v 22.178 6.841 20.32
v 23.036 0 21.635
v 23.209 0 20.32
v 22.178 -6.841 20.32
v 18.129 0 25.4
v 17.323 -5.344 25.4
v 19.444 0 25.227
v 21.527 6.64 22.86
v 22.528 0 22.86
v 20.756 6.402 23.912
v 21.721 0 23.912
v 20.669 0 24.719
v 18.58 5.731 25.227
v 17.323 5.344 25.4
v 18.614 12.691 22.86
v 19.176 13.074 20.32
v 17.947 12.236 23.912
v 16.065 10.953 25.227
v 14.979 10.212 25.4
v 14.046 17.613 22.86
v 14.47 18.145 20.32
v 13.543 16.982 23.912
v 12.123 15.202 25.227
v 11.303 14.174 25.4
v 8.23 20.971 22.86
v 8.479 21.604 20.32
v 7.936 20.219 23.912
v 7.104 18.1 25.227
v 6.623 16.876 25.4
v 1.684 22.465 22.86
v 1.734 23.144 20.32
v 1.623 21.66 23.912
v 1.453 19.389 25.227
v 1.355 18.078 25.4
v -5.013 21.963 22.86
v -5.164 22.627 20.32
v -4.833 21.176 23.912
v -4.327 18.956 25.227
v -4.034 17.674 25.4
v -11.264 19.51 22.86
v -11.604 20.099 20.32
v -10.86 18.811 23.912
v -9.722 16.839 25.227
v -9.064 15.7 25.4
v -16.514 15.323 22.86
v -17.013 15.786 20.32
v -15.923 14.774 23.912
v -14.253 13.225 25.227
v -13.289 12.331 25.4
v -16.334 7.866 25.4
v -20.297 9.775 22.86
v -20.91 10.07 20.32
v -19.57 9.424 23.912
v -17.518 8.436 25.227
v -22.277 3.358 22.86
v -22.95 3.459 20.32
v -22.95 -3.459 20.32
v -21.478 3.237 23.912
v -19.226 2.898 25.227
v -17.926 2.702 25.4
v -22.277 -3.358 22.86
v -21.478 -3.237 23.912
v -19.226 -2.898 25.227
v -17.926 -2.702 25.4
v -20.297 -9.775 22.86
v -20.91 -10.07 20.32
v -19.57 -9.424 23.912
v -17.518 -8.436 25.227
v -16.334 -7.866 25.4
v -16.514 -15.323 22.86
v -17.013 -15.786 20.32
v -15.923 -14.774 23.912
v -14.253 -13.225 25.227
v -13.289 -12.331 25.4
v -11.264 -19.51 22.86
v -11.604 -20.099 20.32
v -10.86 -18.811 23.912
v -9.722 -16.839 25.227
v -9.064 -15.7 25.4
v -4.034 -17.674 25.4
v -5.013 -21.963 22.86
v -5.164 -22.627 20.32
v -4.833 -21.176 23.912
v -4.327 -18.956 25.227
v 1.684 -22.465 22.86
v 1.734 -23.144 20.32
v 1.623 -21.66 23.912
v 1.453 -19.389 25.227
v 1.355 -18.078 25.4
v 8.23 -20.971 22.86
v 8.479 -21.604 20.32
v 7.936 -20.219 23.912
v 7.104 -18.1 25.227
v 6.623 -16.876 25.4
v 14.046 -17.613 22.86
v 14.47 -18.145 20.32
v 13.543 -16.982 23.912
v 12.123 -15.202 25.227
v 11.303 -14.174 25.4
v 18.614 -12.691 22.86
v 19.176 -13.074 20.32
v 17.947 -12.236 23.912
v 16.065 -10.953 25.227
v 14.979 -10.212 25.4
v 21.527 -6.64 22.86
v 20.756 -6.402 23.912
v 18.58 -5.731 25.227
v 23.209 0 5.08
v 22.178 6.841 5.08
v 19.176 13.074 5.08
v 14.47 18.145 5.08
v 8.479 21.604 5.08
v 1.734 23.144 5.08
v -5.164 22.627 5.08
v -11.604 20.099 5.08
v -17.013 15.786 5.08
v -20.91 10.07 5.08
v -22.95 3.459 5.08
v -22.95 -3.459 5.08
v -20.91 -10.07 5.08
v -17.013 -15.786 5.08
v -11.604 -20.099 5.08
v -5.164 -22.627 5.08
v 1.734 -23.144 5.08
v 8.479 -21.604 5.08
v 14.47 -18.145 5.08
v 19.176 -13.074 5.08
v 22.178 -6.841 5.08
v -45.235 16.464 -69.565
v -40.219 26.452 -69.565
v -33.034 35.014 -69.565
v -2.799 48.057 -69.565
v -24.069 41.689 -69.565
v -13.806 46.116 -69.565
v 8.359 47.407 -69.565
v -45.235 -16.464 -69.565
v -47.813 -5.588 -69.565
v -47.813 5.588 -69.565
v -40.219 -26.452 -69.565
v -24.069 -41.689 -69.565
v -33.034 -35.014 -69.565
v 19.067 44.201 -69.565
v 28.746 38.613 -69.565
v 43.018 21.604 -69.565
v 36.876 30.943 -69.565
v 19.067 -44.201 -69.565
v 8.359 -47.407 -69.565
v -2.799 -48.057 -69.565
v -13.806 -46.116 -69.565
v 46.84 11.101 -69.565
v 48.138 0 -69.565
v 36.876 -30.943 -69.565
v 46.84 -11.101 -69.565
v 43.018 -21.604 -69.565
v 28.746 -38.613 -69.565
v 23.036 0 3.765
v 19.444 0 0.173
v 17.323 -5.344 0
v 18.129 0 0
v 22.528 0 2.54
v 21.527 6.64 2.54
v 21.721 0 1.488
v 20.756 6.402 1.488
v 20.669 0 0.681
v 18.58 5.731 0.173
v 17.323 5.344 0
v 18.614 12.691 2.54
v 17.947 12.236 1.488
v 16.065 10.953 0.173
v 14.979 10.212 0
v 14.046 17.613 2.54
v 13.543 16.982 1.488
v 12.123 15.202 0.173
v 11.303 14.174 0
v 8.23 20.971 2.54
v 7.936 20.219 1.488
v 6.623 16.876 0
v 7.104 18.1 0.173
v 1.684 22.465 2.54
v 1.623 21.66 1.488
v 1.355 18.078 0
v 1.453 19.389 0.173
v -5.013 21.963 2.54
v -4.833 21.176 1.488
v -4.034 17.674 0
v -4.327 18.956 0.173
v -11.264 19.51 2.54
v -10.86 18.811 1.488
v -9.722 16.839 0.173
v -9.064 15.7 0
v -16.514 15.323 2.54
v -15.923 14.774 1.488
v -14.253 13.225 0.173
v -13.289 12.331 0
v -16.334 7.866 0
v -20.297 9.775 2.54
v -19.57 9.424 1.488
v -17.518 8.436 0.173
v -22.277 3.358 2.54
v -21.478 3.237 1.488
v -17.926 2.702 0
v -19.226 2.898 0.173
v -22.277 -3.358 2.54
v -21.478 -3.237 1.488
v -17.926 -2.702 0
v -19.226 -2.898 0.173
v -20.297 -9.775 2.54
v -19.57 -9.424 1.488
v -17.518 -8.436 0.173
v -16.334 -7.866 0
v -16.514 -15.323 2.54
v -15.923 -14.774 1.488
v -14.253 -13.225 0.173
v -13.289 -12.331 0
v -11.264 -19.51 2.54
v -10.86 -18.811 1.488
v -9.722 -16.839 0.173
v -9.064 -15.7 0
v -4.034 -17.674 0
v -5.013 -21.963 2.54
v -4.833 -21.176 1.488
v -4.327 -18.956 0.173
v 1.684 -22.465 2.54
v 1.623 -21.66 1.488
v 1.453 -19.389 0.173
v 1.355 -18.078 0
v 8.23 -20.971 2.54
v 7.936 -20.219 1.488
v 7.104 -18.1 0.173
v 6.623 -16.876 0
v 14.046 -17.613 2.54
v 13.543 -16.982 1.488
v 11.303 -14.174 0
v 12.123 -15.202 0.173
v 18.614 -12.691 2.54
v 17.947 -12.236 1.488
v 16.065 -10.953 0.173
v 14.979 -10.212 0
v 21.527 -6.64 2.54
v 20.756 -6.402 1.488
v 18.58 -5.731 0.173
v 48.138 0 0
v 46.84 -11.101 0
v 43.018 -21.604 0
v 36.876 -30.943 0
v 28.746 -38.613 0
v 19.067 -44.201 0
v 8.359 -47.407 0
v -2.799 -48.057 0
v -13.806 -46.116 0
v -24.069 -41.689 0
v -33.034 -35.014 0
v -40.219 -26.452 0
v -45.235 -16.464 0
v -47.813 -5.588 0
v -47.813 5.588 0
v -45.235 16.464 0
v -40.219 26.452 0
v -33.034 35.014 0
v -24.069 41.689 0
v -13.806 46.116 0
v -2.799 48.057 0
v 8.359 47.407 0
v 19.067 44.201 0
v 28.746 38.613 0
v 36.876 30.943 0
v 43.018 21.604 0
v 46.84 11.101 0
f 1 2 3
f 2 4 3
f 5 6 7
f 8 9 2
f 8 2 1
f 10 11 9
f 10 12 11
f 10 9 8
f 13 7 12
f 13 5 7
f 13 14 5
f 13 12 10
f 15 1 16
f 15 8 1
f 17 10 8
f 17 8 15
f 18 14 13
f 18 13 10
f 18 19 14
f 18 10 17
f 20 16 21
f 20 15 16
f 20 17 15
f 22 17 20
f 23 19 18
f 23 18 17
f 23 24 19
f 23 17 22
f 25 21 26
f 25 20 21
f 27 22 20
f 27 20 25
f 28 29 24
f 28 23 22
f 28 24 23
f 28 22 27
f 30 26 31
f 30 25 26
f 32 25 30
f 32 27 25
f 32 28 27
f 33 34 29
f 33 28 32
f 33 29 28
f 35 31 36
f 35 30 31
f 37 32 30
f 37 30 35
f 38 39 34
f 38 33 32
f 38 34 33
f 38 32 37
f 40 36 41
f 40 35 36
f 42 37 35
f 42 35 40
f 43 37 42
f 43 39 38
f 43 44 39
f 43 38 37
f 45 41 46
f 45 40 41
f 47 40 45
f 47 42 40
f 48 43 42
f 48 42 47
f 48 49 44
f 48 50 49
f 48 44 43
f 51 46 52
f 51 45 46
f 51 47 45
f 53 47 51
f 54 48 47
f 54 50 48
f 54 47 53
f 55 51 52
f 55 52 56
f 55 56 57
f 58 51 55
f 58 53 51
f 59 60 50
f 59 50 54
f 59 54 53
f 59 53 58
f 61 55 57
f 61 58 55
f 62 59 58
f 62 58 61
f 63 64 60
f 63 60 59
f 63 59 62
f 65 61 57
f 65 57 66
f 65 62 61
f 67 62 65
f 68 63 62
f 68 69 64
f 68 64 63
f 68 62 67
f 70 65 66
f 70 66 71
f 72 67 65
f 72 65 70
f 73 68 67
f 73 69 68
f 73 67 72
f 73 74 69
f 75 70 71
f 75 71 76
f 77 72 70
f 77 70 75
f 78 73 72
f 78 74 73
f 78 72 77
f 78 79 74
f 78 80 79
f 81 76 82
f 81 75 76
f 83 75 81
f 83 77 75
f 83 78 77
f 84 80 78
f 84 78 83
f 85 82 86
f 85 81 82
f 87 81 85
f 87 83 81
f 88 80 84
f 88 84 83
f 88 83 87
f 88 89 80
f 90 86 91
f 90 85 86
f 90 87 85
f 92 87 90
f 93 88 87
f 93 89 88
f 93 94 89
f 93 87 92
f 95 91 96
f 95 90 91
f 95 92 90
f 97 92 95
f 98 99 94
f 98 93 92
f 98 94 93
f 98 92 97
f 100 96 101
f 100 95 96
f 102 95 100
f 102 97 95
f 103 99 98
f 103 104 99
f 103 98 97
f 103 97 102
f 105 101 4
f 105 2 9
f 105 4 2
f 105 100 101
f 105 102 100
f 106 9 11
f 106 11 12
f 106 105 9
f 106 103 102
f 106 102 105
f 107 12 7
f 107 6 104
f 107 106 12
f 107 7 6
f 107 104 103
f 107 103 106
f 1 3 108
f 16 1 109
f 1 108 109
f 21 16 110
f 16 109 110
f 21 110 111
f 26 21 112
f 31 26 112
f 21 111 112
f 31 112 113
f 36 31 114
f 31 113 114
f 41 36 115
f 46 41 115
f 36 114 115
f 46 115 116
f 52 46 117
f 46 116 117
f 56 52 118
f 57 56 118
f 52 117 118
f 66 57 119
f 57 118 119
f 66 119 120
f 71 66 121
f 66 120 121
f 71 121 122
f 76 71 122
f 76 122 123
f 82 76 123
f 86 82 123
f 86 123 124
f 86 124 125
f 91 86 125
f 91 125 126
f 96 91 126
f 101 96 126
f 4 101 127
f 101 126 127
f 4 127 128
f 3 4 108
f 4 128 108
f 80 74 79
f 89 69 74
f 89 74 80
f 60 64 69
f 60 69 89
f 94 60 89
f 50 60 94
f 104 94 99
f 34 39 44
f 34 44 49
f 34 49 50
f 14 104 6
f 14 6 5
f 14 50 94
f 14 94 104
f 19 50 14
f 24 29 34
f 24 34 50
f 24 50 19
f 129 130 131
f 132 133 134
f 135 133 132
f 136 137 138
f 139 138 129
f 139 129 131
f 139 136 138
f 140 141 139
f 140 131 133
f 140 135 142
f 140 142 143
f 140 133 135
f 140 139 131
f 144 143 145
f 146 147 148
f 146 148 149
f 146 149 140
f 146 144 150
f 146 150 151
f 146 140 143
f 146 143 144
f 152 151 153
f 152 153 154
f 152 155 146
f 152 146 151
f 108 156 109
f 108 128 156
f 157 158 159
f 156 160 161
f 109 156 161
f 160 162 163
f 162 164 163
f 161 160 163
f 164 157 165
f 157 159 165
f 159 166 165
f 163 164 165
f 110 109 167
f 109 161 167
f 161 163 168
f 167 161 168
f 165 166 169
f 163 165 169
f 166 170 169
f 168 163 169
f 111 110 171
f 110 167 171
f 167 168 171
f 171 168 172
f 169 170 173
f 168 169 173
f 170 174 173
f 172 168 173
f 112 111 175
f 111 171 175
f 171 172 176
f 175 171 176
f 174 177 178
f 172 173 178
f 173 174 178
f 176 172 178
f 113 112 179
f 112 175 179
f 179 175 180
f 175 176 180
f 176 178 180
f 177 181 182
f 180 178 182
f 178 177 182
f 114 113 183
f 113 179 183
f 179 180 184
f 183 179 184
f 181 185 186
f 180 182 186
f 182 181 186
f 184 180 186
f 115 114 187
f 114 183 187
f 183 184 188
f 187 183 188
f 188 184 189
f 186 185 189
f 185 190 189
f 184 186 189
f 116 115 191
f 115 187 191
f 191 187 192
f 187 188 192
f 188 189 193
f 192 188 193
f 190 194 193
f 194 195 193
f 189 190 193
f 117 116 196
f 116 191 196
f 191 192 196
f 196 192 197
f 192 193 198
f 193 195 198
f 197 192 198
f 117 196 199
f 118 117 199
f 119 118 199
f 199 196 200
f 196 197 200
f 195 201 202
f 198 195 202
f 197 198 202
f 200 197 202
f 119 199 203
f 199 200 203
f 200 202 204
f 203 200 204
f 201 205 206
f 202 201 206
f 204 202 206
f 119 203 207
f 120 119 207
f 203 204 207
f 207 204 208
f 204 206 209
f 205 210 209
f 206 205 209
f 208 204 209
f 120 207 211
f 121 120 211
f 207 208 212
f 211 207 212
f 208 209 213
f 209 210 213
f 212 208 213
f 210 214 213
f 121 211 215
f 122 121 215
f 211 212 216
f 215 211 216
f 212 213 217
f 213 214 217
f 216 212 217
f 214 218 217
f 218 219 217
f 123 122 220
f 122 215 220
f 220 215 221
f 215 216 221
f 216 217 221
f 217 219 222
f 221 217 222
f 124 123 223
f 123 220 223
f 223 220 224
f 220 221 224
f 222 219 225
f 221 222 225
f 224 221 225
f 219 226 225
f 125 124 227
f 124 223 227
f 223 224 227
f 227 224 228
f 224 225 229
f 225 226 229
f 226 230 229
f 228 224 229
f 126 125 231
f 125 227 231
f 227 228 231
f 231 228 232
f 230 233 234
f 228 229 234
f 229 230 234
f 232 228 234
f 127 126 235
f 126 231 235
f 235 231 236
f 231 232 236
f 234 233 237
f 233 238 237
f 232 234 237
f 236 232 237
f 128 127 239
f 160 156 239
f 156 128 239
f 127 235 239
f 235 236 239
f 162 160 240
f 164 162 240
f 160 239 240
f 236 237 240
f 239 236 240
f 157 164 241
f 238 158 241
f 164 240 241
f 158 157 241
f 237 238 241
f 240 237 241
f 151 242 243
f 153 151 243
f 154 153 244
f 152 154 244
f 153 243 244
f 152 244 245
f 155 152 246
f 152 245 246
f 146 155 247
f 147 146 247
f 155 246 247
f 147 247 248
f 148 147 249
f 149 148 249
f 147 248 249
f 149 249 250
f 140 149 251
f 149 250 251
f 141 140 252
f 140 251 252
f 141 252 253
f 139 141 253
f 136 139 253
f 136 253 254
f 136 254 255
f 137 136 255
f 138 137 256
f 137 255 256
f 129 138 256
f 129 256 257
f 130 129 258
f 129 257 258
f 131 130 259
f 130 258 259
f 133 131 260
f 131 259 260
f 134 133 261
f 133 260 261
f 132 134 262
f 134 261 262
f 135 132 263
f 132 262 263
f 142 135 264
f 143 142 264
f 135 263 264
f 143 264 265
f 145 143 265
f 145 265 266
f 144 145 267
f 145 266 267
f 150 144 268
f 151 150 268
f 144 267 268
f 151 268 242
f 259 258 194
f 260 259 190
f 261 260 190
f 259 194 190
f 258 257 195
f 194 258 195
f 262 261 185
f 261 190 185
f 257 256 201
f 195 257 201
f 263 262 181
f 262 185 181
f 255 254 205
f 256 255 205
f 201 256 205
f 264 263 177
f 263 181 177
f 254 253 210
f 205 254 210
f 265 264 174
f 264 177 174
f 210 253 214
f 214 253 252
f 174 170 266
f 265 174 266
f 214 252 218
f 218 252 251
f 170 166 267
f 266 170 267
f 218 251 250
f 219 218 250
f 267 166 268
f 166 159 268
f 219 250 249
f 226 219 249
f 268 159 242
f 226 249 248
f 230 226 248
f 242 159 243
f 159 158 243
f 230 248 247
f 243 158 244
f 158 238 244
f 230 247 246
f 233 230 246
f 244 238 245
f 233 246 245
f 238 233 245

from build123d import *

# Parameters (mm, degrees)
F0_R     = 23.208825
F1_DEPTH = 25.4
F2_R     = 5.08
F3_R     = 48.138061
F4_DEPTH = 69.56518


with BuildPart() as f1:
    # F0 (on Top) → F1 (new body)
    with BuildSketch(Plane.XY):
        Circle(F0_R)
    extrude(amount=F1_DEPTH)

    # F2
    f2_edges = [f1.edges().sort_by_distance(p)[0] for p in [
        (-23.208825, 0, 0),
        (-23.208825, 0, 25.4),
    ]]
    fillet(f2_edges, radius=F2_R)

    # F3 (on face) → F4 (join)
    with BuildSketch(Plane(origin=(0, 0, 0), x_dir=(1, 0, 0), z_dir=(0, 0, -1))):
        Circle(F3_R)
    extrude(amount=F4_DEPTH)


solid = f1.part
